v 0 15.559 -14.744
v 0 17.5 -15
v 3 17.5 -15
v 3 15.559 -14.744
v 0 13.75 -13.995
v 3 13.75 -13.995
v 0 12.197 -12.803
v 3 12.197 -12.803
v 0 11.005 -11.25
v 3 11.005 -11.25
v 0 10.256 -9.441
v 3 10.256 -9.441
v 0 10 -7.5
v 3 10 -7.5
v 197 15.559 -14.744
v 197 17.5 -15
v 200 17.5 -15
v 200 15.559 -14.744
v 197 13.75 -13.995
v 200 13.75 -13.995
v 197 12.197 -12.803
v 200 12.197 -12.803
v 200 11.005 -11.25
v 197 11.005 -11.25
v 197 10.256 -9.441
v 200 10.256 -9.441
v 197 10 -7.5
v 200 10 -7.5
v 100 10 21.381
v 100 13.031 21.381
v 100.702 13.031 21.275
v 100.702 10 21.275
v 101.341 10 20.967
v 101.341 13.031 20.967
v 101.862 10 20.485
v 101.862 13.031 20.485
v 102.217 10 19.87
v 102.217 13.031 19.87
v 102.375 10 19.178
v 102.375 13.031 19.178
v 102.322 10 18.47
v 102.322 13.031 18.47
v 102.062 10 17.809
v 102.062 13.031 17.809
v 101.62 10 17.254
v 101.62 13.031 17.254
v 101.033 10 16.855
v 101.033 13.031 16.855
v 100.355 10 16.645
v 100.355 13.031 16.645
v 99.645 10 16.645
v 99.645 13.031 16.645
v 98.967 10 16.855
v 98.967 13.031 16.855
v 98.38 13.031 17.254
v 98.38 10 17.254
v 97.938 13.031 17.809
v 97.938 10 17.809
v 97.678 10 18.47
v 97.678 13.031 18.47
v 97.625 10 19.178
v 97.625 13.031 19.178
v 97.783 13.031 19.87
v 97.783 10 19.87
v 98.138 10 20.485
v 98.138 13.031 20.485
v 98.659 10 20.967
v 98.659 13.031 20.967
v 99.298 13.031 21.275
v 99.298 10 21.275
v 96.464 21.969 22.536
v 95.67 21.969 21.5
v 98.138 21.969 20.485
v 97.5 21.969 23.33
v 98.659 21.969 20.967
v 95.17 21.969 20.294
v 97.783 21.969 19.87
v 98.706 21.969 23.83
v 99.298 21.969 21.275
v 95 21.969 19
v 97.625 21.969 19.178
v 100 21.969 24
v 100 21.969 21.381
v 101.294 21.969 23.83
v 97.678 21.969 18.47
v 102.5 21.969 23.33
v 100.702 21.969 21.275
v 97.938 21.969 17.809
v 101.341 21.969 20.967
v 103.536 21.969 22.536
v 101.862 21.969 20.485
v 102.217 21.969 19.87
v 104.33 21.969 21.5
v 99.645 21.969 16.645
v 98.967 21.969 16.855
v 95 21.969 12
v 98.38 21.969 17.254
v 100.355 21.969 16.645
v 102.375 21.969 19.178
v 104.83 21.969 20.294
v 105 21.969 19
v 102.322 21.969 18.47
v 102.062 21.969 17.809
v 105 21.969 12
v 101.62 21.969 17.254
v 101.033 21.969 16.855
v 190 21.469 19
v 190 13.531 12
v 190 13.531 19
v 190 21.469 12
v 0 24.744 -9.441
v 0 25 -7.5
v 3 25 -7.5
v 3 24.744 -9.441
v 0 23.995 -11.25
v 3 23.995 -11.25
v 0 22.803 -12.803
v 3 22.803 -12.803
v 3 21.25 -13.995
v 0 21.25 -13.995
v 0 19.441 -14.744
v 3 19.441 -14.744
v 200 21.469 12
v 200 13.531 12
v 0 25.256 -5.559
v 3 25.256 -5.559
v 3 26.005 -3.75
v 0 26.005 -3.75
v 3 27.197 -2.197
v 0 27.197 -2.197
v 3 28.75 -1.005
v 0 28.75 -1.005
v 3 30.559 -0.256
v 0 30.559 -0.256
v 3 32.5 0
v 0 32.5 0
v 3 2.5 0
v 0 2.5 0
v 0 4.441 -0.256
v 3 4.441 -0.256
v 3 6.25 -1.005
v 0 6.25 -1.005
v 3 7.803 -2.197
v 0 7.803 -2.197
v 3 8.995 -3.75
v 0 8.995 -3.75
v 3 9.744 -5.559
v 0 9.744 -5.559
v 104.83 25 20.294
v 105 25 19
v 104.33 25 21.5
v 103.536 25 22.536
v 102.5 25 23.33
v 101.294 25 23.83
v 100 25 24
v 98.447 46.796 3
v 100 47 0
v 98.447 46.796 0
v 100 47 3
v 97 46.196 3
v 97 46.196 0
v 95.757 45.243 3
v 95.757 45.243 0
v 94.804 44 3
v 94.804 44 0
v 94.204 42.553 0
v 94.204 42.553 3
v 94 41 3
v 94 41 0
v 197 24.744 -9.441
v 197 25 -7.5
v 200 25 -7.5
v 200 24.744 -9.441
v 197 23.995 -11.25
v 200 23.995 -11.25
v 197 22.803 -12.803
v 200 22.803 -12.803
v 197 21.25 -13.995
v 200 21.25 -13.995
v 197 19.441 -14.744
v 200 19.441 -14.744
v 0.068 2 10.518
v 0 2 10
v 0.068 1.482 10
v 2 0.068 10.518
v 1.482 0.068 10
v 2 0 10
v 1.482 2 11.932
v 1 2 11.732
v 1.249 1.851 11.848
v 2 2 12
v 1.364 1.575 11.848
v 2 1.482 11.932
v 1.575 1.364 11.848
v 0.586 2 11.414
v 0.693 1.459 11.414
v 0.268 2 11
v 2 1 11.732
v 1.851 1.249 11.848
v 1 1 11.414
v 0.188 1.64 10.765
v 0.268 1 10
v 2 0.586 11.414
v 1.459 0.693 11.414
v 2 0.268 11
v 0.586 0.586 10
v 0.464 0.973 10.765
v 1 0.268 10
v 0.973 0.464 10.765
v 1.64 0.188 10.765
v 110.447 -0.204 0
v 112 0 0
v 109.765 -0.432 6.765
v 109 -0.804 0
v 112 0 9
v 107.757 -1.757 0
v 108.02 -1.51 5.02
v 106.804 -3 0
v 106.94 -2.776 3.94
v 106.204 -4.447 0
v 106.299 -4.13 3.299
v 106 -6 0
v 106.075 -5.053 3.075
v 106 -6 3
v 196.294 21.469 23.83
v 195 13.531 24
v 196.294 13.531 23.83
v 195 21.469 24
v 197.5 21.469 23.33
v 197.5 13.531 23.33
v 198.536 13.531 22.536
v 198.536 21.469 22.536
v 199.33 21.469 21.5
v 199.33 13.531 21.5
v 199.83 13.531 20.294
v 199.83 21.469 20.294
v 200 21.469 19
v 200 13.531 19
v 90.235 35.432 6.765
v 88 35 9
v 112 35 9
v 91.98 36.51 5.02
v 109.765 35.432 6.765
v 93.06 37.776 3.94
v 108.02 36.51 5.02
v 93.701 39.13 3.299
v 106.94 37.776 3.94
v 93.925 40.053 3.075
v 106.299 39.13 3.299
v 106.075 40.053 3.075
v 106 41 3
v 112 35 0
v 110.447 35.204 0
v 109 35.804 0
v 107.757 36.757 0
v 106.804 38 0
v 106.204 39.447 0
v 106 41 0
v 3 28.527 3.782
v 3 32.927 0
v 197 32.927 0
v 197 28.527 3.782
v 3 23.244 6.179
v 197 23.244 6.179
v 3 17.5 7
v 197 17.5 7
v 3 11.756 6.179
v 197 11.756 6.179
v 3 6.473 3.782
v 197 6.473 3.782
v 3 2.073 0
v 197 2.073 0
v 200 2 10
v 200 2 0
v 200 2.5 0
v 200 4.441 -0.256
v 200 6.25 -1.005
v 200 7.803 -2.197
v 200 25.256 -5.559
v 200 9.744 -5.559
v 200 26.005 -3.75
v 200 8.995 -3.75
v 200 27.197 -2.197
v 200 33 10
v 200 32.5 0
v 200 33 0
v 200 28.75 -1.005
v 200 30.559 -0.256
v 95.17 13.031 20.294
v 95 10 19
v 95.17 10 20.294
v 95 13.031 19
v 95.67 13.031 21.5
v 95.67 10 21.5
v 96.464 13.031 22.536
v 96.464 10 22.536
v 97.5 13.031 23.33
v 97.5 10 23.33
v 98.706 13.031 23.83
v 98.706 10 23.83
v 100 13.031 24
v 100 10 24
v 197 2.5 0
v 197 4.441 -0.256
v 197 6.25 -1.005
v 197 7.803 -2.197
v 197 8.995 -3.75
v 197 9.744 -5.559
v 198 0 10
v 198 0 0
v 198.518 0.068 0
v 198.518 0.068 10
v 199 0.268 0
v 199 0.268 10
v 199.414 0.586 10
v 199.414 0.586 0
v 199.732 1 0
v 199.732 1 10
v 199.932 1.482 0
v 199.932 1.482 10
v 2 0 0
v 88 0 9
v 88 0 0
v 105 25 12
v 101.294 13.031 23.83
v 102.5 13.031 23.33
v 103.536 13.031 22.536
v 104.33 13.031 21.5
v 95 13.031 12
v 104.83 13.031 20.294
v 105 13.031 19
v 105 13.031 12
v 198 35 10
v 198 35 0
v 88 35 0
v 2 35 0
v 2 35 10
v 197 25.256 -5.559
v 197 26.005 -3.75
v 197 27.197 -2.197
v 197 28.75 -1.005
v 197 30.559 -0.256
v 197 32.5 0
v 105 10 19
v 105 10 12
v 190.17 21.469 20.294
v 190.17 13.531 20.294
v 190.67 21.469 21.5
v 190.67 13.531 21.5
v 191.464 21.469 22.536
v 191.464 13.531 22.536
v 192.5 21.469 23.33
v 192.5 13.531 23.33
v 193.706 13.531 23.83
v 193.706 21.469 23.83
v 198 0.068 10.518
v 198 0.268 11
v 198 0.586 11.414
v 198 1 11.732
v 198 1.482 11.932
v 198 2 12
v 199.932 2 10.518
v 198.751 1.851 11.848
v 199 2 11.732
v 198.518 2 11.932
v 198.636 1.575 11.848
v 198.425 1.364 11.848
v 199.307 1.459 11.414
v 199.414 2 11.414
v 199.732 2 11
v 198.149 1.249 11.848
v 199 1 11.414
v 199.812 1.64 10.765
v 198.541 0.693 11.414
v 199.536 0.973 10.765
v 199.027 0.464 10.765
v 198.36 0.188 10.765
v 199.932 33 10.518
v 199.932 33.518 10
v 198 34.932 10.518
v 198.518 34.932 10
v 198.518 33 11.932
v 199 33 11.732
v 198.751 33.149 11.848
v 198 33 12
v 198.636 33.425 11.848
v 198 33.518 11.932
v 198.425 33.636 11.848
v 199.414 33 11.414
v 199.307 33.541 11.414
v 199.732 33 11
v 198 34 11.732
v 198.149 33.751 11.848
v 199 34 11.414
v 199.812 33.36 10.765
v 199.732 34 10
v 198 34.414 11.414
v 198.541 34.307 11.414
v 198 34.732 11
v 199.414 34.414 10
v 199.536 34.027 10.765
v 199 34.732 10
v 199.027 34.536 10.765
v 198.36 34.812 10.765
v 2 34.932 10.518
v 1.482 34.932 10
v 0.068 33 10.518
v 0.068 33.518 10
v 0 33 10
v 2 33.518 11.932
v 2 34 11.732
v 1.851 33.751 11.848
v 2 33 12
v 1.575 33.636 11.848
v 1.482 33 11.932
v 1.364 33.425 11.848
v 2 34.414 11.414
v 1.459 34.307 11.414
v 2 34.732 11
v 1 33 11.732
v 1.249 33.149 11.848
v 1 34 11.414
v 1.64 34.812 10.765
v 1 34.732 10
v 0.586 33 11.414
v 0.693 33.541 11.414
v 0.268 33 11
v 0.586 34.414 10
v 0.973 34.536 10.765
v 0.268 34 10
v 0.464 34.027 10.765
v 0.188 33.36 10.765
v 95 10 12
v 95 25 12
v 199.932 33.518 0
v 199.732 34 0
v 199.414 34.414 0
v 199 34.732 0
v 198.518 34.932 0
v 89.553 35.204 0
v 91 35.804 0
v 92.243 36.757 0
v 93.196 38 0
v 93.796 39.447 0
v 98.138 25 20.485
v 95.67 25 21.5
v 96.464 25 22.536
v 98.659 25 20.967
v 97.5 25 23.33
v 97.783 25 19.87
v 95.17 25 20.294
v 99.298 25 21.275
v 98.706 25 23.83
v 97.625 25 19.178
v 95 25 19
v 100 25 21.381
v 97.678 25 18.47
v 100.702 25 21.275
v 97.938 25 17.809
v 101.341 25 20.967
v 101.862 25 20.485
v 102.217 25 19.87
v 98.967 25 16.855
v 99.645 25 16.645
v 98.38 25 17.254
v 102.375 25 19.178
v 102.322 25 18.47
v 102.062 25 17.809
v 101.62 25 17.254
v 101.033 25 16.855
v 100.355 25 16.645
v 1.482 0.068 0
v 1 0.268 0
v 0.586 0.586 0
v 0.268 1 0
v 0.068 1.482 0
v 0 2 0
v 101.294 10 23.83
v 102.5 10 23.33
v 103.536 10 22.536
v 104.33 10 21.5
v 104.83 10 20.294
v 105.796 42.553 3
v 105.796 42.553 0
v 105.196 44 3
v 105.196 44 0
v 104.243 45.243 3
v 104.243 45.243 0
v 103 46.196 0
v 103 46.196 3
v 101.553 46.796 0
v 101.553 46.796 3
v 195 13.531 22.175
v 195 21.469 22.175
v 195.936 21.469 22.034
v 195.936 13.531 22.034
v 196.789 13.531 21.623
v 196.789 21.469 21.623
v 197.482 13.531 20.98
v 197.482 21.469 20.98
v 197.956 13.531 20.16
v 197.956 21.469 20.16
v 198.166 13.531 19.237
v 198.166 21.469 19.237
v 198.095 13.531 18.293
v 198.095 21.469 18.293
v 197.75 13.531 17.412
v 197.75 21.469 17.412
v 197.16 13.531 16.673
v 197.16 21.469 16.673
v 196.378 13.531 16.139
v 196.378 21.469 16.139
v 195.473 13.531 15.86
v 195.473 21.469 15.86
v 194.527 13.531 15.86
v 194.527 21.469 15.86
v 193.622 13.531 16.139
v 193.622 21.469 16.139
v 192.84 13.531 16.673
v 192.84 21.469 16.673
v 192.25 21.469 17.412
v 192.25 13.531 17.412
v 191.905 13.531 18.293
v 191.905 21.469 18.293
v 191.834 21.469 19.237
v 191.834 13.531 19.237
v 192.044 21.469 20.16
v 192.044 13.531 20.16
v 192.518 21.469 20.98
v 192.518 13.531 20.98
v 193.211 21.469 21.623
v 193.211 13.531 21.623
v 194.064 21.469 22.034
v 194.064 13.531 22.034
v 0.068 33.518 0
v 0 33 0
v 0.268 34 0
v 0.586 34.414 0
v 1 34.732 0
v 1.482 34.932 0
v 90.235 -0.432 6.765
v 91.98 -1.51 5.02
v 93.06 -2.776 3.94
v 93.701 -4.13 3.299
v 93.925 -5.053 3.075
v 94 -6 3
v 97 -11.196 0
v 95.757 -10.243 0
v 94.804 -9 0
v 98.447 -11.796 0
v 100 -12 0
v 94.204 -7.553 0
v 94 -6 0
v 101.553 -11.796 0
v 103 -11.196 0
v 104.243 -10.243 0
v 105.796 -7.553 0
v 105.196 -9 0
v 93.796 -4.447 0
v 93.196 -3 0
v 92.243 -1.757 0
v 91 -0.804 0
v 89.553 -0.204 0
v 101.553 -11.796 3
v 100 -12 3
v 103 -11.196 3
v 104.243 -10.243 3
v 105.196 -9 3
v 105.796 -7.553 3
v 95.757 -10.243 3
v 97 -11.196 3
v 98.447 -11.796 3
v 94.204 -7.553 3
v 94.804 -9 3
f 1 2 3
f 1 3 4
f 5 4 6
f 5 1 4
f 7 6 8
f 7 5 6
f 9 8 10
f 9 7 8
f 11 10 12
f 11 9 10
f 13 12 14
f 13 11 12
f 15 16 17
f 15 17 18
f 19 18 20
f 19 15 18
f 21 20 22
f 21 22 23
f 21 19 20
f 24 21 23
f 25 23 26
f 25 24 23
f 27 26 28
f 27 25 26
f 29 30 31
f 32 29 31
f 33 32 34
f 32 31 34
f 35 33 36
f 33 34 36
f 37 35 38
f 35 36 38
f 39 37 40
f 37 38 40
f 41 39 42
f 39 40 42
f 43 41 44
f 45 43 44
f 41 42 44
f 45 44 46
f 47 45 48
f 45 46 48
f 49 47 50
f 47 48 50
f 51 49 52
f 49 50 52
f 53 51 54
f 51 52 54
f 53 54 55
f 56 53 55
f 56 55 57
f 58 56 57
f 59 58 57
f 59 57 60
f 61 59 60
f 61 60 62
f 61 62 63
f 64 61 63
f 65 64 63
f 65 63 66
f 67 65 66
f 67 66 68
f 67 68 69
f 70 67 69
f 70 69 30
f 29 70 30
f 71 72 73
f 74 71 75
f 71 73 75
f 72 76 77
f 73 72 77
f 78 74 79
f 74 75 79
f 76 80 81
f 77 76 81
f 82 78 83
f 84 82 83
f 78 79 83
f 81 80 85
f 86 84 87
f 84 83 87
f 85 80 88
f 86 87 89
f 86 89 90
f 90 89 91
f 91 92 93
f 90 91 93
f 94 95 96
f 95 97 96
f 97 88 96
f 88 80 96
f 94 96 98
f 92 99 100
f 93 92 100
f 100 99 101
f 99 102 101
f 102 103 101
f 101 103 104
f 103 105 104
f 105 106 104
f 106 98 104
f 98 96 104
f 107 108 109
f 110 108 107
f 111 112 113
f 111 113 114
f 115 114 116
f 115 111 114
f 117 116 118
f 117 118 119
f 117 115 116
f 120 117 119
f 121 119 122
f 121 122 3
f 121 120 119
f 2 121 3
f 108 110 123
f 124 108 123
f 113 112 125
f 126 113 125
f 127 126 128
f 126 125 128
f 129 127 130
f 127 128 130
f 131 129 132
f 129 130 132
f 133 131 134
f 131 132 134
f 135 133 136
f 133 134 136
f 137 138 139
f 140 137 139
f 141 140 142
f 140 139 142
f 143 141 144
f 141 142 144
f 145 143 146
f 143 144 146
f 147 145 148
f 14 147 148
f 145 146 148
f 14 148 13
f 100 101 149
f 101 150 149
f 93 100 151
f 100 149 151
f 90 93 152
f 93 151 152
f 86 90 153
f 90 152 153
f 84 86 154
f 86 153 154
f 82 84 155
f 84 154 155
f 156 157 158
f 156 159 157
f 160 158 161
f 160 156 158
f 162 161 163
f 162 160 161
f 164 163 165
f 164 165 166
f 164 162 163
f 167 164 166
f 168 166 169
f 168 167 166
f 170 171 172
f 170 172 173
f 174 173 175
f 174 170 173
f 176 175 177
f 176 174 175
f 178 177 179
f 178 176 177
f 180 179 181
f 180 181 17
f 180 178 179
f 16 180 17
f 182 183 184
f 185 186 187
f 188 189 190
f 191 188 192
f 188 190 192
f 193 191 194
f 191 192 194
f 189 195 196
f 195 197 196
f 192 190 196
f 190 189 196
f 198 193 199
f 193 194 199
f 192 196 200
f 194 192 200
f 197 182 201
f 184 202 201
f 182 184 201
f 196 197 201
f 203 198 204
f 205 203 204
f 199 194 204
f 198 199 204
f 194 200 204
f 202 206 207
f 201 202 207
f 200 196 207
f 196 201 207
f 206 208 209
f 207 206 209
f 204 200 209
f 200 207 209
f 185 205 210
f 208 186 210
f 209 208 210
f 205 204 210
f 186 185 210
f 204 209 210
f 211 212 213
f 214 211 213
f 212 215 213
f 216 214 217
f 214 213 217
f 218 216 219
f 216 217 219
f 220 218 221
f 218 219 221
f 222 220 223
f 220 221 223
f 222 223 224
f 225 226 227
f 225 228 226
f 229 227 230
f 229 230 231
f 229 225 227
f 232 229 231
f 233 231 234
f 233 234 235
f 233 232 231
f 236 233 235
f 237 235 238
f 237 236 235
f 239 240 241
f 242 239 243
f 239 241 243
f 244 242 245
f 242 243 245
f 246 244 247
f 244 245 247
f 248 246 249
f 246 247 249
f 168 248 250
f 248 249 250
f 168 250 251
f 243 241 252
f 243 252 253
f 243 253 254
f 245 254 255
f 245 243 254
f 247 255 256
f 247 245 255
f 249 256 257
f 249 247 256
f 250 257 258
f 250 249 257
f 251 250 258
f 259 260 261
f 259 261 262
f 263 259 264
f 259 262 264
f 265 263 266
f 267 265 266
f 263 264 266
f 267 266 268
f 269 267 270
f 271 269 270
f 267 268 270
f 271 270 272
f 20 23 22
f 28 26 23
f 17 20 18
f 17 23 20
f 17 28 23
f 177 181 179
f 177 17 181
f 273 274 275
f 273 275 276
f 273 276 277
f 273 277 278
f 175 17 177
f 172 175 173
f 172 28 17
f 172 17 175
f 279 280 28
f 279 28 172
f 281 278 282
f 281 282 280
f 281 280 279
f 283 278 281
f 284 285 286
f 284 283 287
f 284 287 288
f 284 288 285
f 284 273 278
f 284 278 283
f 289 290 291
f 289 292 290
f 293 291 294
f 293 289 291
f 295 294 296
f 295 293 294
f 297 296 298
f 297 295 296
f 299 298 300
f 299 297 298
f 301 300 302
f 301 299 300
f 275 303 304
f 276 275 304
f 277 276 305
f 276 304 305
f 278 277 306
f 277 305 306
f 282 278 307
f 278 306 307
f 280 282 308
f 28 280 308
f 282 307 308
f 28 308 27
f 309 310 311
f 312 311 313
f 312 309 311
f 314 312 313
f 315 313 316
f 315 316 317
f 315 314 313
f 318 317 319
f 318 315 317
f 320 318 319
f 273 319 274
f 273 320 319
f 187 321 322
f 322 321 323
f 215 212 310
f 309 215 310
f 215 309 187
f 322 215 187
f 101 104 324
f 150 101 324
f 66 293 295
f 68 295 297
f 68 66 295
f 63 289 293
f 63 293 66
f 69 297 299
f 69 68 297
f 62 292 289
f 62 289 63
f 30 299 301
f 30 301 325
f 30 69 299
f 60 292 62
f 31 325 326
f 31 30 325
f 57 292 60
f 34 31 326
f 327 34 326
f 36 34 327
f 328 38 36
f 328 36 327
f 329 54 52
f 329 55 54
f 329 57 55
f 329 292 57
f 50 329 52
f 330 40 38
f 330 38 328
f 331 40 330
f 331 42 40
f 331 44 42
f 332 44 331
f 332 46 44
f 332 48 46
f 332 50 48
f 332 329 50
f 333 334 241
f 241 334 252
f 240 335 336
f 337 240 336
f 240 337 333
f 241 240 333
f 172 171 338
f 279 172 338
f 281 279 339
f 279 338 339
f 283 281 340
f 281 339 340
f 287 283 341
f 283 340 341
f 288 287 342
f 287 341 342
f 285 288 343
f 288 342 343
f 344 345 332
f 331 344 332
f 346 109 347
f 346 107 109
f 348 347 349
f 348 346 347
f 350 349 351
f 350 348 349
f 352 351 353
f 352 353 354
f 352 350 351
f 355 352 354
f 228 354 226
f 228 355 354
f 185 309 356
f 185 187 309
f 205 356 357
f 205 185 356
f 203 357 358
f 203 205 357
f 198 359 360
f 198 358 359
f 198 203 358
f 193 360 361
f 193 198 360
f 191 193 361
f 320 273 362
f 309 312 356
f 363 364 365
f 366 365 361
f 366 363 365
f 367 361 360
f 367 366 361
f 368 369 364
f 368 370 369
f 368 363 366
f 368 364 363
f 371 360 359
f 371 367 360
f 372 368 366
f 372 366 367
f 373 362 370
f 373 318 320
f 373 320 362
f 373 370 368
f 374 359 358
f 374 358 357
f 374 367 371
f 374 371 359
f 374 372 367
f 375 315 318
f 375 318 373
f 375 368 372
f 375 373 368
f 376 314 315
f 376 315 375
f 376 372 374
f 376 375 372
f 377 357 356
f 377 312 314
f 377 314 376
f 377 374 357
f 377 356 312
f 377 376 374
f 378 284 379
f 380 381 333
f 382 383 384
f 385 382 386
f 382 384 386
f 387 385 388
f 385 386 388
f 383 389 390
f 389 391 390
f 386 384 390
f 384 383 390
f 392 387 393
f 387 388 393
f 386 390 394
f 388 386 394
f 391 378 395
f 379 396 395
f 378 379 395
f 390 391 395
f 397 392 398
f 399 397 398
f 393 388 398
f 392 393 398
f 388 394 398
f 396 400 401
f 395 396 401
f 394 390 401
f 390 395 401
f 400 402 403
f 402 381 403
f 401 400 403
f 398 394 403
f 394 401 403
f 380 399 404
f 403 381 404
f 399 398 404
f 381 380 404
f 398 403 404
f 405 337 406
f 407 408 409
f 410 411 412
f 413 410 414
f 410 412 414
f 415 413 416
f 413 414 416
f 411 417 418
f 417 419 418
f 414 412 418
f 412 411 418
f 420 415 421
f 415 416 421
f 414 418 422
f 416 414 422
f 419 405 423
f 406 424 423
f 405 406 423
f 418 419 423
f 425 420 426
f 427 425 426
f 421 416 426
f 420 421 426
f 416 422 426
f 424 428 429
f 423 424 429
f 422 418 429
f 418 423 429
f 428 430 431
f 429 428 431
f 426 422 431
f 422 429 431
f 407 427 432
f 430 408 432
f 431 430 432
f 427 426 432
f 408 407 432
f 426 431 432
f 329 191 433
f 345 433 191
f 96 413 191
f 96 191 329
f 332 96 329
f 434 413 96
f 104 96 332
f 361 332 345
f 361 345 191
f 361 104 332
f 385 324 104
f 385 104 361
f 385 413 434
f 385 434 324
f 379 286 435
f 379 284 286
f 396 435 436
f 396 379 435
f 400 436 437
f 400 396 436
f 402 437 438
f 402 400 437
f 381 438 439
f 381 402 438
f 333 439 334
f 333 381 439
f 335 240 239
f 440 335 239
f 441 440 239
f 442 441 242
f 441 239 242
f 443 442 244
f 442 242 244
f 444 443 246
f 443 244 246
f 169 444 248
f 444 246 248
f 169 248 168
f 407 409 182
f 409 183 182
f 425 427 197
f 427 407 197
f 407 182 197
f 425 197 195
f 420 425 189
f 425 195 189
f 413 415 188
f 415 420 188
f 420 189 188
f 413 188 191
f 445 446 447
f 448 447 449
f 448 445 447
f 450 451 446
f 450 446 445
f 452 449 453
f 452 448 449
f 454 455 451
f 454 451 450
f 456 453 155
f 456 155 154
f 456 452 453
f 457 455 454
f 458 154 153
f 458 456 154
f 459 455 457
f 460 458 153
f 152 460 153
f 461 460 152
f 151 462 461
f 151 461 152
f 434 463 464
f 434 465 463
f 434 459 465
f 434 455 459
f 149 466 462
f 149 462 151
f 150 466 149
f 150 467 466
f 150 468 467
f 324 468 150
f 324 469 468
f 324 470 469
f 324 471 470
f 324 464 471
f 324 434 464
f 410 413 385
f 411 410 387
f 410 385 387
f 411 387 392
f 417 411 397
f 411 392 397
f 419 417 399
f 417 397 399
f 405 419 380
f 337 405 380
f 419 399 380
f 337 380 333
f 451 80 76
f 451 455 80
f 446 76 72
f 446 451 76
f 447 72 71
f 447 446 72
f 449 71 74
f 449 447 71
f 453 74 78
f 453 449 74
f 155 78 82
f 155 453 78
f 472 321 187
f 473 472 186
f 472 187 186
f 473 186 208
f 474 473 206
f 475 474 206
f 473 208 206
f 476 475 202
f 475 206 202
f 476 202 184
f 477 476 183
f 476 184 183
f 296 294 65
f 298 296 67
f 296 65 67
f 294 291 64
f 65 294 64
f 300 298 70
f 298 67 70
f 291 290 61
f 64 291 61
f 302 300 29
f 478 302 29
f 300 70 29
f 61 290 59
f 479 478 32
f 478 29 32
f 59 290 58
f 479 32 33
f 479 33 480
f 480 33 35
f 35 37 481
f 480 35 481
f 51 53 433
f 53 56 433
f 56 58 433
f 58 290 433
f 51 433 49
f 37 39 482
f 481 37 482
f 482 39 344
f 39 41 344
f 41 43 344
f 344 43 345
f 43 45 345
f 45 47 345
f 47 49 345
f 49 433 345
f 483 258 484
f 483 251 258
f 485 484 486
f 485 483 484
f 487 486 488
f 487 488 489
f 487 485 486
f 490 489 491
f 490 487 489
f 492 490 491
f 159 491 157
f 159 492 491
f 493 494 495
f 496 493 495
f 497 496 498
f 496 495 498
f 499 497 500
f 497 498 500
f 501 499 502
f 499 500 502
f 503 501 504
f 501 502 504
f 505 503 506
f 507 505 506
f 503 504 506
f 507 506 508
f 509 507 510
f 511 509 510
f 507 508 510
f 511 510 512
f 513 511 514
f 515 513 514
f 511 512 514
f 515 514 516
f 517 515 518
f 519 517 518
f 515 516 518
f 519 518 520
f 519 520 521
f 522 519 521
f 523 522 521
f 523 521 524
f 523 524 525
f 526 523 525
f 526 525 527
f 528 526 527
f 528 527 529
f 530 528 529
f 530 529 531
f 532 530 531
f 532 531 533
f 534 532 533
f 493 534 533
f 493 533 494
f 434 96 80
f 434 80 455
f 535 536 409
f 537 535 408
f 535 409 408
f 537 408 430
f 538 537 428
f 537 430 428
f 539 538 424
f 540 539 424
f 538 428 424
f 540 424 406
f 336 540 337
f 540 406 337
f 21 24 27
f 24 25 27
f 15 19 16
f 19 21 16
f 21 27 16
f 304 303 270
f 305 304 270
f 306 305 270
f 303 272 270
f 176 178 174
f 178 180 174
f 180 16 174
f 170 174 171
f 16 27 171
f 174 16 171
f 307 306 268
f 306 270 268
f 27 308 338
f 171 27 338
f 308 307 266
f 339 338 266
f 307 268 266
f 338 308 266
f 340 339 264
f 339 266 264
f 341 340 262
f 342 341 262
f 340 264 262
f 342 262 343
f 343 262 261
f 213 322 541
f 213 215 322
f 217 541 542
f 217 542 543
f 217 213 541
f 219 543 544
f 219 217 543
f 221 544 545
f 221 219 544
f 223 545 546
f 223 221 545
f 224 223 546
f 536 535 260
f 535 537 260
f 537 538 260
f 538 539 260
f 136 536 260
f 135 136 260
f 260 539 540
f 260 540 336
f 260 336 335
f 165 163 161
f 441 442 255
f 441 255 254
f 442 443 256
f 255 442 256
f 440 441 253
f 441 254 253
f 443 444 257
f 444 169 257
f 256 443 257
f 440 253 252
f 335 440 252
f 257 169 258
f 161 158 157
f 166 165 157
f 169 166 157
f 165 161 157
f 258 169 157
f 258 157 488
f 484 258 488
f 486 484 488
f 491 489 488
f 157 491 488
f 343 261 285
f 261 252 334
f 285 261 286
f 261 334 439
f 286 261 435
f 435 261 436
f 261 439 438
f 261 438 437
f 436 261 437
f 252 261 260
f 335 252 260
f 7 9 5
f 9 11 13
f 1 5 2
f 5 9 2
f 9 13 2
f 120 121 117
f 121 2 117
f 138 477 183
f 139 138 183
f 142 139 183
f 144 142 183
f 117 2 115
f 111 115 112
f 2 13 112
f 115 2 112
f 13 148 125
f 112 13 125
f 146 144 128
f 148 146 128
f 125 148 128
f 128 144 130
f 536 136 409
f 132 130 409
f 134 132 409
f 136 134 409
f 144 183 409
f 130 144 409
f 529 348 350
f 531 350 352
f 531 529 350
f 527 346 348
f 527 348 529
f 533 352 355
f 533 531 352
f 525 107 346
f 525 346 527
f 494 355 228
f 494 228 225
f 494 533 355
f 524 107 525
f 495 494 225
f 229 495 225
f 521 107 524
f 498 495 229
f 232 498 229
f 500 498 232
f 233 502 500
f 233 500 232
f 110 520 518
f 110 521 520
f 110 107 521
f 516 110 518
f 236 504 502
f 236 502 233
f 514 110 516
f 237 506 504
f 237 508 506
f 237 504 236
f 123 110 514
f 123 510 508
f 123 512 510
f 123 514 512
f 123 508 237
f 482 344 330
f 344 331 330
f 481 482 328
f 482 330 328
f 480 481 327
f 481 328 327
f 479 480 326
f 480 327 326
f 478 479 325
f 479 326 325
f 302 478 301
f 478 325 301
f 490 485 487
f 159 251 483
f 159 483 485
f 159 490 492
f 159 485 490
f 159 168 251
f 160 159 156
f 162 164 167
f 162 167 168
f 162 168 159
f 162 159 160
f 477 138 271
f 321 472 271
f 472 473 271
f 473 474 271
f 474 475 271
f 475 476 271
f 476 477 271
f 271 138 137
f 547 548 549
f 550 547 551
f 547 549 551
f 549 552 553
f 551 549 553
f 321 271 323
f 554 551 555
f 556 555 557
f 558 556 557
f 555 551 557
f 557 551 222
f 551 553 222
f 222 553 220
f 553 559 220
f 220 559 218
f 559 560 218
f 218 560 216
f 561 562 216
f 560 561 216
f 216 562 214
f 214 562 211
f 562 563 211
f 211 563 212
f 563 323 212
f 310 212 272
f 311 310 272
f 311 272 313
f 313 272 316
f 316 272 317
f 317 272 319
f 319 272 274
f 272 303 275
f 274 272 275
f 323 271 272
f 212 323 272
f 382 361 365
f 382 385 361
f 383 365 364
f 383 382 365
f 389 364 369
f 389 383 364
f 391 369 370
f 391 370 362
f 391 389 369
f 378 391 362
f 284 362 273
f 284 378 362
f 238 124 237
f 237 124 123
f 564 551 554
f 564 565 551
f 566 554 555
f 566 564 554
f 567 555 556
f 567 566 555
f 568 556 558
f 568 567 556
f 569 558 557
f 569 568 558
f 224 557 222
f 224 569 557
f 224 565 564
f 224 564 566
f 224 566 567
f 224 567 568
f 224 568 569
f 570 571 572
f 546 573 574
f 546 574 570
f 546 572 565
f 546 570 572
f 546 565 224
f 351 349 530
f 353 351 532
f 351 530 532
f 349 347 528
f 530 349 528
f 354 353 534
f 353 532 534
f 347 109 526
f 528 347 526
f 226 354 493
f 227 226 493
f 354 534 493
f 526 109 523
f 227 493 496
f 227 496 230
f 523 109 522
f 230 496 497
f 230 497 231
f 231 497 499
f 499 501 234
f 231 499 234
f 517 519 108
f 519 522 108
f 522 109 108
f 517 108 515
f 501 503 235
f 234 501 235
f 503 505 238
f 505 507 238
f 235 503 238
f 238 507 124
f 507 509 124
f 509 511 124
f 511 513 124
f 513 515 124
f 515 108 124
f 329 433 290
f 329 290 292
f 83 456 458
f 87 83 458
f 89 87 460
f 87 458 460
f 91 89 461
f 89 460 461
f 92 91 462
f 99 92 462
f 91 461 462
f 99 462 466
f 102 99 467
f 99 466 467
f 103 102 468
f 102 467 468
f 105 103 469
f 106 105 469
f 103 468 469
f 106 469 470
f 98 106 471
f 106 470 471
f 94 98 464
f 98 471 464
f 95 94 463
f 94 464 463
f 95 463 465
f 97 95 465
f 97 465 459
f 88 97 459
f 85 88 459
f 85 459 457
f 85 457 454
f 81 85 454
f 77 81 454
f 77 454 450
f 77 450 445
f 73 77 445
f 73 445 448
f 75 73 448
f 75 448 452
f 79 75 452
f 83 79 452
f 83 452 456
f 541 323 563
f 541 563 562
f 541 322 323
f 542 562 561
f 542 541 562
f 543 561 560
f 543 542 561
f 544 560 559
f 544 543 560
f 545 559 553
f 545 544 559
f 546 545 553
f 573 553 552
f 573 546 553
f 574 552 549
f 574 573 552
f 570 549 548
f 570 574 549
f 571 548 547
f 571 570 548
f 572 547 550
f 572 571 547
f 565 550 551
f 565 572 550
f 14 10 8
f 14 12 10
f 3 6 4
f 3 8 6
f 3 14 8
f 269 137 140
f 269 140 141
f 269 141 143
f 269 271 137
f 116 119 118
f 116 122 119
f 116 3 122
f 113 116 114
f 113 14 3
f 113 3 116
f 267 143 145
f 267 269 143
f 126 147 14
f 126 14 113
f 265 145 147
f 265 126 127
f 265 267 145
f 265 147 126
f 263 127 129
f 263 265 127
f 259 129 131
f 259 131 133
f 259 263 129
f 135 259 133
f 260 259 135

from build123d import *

# Parameters (mm, degrees)
BOSS_EXTRUDE1_DEPTH = 12
SKETCH7_W           = 10
SKETCH7_H           = 7.9375
BOSS_EXTRUDE2_DEPTH = 12
SKETCH9_R           = 3.175
CUT_EXTRUDE3_DEPTH  = 205.196369279
SKETCH15_W          = 10
SKETCH15_H          = 3.03125
BOSS_EXTRUDE4_DEPTH = 12
SKETCH16_R          = 2.38125
CUT_EXTRUDE7_DEPTH  = 205.8047851
FILLET1_R           = 5
FILLET2_R           = 5
SKETCH17_R          = 20.5
CUT_EXTRUDE8_DEPTH  = 194
SKETCH18_W          = 3
SKETCH18_H          = 15
BOSS_EXTRUDE5_DEPTH = 15
FILLET3_DEPTH       = 200
FILLET3_2_DEPTH     = 3
FILLET3_START       = 197
FILLET3_3_DEPTH     = 3
SKETCH19_W          = 9
SKETCH19_H          = 12
CUT_EXTRUDE9_DEPTH  = 12
FILLET4_R           = 6
FILLET5_R           = 2


with BuildPart() as part:
    # Sketch2 → Boss-Extrude1 (new body)
    with BuildSketch(Plane.XY):
        Polygon((0, 0), (94, 0), (94, -12), (106, -12), (106, 0), (200, 0), (200, 35), (106, 35), (106, 47), (94, 47), (94, 35), (0, 35), align=None)
    extrude(amount=BOSS_EXTRUDE1_DEPTH)

    # Sketch15 → Boss-Extrude4 (add)
    with BuildSketch(Plane.XY.offset(12)):
        with Locations((100, 23.484375)):
            Rectangle(SKETCH15_W, SKETCH15_H)
        with Locations((100, 11.515625)):
            Rectangle(SKETCH15_W, SKETCH15_H)
    extrude(amount=BOSS_EXTRUDE4_DEPTH)

    # Sketch16 → Cut-Extrude7 (cut, through all)
    with BuildSketch(Plane(origin=(0, 25, 0), x_dir=(1, 0, 0), z_dir=(0, 1, 0))):
        with Locations(Location((100, -19, 0), (0, 0, 270))):
            Circle(SKETCH16_R)
    extrude(amount=-CUT_EXTRUDE7_DEPTH, mode=Mode.SUBTRACT)

    # Fillet2
    fillet2_edges = [part.edges().sort_by_distance(p)[0] for p in [
        (95, 11.515625, 24),
        (105, 11.515625, 24),
        (105, 23.484375, 24),
        (95, 23.484375, 24),
    ]]
    fillet(fillet2_edges, radius=FILLET2_R - 0.0001)  # a hair under: the kernel refuses the full size

    # Sketch17 → Cut-Extrude8 (cut)
    with BuildSketch(Plane(origin=(197, 0, 0), x_dir=(0, 0, -1), z_dir=(1, 0, 0))):
        with Locations((13.5, 17.5)):
            Circle(SKETCH17_R)
    extrude(amount=-CUT_EXTRUDE8_DEPTH, mode=Mode.SUBTRACT)

    # Sketch18 → Boss-Extrude5 (add)
    with BuildSketch(Plane(origin=(0, 0, 0), x_dir=(-1, 0, 0), z_dir=(0, 0, -1))):
        with Locations((-1.5, 17.5)):
            Rectangle(SKETCH18_W, SKETCH18_H)
        with Locations((-198.5, 17.5)):
            Rectangle(SKETCH18_W, SKETCH18_H)
    extrude(amount=BOSS_EXTRUDE5_DEPTH)

    # Fillet3: read off the stored shape, not the designer's step
    # Fillet3 outline → Fillet3 (cut)
    with BuildSketch(Plane.YZ):
        with BuildLine():
            Line((10, -15), (17.5, -15))
            ThreePointArc((17.5, -15), (12.196699141, -12.803300859), (10, -7.5))
            Line((10, -7.5), (10, -15))
        make_face()
        with BuildLine():
            Line((25, -15), (25, -7.5))
            ThreePointArc((25, -7.5), (22.803300859, -12.803300859), (17.5, -15))
            Line((17.5, -15), (25, -15))
        make_face()
    extrude(amount=FILLET3_DEPTH, mode=Mode.SUBTRACT)

    # Fillet3 2 outline → Fillet3 2 (add)
    with BuildSketch(Plane.YZ):
        with BuildLine():
            ThreePointArc((2.5, 0), (7.803300859, -2.196699141), (10, -7.5))
            Line((10, -7.5), (10, 0))
            Line((10, 0), (2.5, 0))
        make_face()
        with BuildLine():
            ThreePointArc((25, -7.5), (27.196699141, -2.196699141), (32.5, 0))
            Line((32.5, 0), (25, 0))
            Line((25, 0), (25, -7.5))
        make_face()
    extrude(amount=FILLET3_2_DEPTH)

    # Fillet3 3 outline → Fillet3 3 (add)
    with BuildSketch(Plane.YZ.offset(FILLET3_START)):
        with BuildLine():
            ThreePointArc((2.5, 0), (7.803300859, -2.196699141), (10, -7.5))
            Line((10, -7.5), (10, 0))
            Line((10, 0), (2.5, 0))
        make_face()
        with BuildLine():
            ThreePointArc((25, -7.5), (27.196699141, -2.196699141), (32.5, 0))
            Line((32.5, 0), (25, 0))
            Line((25, 0), (25, -7.5))
        make_face()
    extrude(amount=FILLET3_3_DEPTH)

    # Sketch19 → Cut-Extrude9 (cut)
    with BuildSketch(Plane.ZY.offset(-94)):
        with Locations((7.5, -6)):
            Rectangle(SKETCH19_W, SKETCH19_H)
        with Locations((7.5, 41)):
            Rectangle(SKETCH19_W, SKETCH19_H)
    extrude(amount=-CUT_EXTRUDE9_DEPTH, mode=Mode.SUBTRACT)

    # Fillet4
    fillet4_edges = [part.edges().sort_by_distance(p)[0] for p in [
        (94, 35, 1.5),
        (100, 35, 3),
        (106, 35, 1.5),
        (106, 47, 1.5),
        (94, 47, 1.5),
        (94, 0, 1.5),
        (100, 0, 3),
        (106, 0, 1.5),
        (94, -12, 1.5),
        (106, -12, 1.5),
    ]]
    fillet(fillet4_edges, radius=FILLET4_R - 0.0001)  # a hair under: the kernel refuses the full size

    # Fillet5
    fillet5_edges = [part.edges().sort_by_distance(p)[0] for p in [
        (0, 35, 6),
        (200, 35, 6),
        (200, 0, 6),
        (0, 0, 6),
        (200, 17.5, 12),
        (100, 35, 12),
        (0, 17.5, 12),
        (100, 0, 12),
    ]]
    fillet(fillet5_edges, radius=FILLET5_R)


with BuildPart() as body_2:
    # Sketch7 → Boss-Extrude2 (new body)
    with BuildSketch(Plane.XY.offset(12)):
        with Locations((195, 17.5)):
            Rectangle(SKETCH7_W, SKETCH7_H)
    extrude(amount=BOSS_EXTRUDE2_DEPTH)

    # Sketch9 → Cut-Extrude3 (cut, through all)
    with BuildSketch(Plane(origin=(0, 21.46875, 0), x_dir=(1, 0, 0), z_dir=(0, 1, 0))):
        with Locations(Location((195, -19, 0), (0, 0, 270))):
            Circle(SKETCH9_R)
    extrude(amount=-CUT_EXTRUDE3_DEPTH, mode=Mode.SUBTRACT)

    # Fillet1
    fillet1_edges = [body_2.edges().sort_by_distance(p)[0] for p in [
        (190, 17.5, 24),
        (200, 17.5, 24),
    ]]
    fillet(fillet1_edges, radius=FILLET1_R - 0.0001)  # a hair under: the kernel refuses the full size


solid = Compound([part.part, body_2.part])
